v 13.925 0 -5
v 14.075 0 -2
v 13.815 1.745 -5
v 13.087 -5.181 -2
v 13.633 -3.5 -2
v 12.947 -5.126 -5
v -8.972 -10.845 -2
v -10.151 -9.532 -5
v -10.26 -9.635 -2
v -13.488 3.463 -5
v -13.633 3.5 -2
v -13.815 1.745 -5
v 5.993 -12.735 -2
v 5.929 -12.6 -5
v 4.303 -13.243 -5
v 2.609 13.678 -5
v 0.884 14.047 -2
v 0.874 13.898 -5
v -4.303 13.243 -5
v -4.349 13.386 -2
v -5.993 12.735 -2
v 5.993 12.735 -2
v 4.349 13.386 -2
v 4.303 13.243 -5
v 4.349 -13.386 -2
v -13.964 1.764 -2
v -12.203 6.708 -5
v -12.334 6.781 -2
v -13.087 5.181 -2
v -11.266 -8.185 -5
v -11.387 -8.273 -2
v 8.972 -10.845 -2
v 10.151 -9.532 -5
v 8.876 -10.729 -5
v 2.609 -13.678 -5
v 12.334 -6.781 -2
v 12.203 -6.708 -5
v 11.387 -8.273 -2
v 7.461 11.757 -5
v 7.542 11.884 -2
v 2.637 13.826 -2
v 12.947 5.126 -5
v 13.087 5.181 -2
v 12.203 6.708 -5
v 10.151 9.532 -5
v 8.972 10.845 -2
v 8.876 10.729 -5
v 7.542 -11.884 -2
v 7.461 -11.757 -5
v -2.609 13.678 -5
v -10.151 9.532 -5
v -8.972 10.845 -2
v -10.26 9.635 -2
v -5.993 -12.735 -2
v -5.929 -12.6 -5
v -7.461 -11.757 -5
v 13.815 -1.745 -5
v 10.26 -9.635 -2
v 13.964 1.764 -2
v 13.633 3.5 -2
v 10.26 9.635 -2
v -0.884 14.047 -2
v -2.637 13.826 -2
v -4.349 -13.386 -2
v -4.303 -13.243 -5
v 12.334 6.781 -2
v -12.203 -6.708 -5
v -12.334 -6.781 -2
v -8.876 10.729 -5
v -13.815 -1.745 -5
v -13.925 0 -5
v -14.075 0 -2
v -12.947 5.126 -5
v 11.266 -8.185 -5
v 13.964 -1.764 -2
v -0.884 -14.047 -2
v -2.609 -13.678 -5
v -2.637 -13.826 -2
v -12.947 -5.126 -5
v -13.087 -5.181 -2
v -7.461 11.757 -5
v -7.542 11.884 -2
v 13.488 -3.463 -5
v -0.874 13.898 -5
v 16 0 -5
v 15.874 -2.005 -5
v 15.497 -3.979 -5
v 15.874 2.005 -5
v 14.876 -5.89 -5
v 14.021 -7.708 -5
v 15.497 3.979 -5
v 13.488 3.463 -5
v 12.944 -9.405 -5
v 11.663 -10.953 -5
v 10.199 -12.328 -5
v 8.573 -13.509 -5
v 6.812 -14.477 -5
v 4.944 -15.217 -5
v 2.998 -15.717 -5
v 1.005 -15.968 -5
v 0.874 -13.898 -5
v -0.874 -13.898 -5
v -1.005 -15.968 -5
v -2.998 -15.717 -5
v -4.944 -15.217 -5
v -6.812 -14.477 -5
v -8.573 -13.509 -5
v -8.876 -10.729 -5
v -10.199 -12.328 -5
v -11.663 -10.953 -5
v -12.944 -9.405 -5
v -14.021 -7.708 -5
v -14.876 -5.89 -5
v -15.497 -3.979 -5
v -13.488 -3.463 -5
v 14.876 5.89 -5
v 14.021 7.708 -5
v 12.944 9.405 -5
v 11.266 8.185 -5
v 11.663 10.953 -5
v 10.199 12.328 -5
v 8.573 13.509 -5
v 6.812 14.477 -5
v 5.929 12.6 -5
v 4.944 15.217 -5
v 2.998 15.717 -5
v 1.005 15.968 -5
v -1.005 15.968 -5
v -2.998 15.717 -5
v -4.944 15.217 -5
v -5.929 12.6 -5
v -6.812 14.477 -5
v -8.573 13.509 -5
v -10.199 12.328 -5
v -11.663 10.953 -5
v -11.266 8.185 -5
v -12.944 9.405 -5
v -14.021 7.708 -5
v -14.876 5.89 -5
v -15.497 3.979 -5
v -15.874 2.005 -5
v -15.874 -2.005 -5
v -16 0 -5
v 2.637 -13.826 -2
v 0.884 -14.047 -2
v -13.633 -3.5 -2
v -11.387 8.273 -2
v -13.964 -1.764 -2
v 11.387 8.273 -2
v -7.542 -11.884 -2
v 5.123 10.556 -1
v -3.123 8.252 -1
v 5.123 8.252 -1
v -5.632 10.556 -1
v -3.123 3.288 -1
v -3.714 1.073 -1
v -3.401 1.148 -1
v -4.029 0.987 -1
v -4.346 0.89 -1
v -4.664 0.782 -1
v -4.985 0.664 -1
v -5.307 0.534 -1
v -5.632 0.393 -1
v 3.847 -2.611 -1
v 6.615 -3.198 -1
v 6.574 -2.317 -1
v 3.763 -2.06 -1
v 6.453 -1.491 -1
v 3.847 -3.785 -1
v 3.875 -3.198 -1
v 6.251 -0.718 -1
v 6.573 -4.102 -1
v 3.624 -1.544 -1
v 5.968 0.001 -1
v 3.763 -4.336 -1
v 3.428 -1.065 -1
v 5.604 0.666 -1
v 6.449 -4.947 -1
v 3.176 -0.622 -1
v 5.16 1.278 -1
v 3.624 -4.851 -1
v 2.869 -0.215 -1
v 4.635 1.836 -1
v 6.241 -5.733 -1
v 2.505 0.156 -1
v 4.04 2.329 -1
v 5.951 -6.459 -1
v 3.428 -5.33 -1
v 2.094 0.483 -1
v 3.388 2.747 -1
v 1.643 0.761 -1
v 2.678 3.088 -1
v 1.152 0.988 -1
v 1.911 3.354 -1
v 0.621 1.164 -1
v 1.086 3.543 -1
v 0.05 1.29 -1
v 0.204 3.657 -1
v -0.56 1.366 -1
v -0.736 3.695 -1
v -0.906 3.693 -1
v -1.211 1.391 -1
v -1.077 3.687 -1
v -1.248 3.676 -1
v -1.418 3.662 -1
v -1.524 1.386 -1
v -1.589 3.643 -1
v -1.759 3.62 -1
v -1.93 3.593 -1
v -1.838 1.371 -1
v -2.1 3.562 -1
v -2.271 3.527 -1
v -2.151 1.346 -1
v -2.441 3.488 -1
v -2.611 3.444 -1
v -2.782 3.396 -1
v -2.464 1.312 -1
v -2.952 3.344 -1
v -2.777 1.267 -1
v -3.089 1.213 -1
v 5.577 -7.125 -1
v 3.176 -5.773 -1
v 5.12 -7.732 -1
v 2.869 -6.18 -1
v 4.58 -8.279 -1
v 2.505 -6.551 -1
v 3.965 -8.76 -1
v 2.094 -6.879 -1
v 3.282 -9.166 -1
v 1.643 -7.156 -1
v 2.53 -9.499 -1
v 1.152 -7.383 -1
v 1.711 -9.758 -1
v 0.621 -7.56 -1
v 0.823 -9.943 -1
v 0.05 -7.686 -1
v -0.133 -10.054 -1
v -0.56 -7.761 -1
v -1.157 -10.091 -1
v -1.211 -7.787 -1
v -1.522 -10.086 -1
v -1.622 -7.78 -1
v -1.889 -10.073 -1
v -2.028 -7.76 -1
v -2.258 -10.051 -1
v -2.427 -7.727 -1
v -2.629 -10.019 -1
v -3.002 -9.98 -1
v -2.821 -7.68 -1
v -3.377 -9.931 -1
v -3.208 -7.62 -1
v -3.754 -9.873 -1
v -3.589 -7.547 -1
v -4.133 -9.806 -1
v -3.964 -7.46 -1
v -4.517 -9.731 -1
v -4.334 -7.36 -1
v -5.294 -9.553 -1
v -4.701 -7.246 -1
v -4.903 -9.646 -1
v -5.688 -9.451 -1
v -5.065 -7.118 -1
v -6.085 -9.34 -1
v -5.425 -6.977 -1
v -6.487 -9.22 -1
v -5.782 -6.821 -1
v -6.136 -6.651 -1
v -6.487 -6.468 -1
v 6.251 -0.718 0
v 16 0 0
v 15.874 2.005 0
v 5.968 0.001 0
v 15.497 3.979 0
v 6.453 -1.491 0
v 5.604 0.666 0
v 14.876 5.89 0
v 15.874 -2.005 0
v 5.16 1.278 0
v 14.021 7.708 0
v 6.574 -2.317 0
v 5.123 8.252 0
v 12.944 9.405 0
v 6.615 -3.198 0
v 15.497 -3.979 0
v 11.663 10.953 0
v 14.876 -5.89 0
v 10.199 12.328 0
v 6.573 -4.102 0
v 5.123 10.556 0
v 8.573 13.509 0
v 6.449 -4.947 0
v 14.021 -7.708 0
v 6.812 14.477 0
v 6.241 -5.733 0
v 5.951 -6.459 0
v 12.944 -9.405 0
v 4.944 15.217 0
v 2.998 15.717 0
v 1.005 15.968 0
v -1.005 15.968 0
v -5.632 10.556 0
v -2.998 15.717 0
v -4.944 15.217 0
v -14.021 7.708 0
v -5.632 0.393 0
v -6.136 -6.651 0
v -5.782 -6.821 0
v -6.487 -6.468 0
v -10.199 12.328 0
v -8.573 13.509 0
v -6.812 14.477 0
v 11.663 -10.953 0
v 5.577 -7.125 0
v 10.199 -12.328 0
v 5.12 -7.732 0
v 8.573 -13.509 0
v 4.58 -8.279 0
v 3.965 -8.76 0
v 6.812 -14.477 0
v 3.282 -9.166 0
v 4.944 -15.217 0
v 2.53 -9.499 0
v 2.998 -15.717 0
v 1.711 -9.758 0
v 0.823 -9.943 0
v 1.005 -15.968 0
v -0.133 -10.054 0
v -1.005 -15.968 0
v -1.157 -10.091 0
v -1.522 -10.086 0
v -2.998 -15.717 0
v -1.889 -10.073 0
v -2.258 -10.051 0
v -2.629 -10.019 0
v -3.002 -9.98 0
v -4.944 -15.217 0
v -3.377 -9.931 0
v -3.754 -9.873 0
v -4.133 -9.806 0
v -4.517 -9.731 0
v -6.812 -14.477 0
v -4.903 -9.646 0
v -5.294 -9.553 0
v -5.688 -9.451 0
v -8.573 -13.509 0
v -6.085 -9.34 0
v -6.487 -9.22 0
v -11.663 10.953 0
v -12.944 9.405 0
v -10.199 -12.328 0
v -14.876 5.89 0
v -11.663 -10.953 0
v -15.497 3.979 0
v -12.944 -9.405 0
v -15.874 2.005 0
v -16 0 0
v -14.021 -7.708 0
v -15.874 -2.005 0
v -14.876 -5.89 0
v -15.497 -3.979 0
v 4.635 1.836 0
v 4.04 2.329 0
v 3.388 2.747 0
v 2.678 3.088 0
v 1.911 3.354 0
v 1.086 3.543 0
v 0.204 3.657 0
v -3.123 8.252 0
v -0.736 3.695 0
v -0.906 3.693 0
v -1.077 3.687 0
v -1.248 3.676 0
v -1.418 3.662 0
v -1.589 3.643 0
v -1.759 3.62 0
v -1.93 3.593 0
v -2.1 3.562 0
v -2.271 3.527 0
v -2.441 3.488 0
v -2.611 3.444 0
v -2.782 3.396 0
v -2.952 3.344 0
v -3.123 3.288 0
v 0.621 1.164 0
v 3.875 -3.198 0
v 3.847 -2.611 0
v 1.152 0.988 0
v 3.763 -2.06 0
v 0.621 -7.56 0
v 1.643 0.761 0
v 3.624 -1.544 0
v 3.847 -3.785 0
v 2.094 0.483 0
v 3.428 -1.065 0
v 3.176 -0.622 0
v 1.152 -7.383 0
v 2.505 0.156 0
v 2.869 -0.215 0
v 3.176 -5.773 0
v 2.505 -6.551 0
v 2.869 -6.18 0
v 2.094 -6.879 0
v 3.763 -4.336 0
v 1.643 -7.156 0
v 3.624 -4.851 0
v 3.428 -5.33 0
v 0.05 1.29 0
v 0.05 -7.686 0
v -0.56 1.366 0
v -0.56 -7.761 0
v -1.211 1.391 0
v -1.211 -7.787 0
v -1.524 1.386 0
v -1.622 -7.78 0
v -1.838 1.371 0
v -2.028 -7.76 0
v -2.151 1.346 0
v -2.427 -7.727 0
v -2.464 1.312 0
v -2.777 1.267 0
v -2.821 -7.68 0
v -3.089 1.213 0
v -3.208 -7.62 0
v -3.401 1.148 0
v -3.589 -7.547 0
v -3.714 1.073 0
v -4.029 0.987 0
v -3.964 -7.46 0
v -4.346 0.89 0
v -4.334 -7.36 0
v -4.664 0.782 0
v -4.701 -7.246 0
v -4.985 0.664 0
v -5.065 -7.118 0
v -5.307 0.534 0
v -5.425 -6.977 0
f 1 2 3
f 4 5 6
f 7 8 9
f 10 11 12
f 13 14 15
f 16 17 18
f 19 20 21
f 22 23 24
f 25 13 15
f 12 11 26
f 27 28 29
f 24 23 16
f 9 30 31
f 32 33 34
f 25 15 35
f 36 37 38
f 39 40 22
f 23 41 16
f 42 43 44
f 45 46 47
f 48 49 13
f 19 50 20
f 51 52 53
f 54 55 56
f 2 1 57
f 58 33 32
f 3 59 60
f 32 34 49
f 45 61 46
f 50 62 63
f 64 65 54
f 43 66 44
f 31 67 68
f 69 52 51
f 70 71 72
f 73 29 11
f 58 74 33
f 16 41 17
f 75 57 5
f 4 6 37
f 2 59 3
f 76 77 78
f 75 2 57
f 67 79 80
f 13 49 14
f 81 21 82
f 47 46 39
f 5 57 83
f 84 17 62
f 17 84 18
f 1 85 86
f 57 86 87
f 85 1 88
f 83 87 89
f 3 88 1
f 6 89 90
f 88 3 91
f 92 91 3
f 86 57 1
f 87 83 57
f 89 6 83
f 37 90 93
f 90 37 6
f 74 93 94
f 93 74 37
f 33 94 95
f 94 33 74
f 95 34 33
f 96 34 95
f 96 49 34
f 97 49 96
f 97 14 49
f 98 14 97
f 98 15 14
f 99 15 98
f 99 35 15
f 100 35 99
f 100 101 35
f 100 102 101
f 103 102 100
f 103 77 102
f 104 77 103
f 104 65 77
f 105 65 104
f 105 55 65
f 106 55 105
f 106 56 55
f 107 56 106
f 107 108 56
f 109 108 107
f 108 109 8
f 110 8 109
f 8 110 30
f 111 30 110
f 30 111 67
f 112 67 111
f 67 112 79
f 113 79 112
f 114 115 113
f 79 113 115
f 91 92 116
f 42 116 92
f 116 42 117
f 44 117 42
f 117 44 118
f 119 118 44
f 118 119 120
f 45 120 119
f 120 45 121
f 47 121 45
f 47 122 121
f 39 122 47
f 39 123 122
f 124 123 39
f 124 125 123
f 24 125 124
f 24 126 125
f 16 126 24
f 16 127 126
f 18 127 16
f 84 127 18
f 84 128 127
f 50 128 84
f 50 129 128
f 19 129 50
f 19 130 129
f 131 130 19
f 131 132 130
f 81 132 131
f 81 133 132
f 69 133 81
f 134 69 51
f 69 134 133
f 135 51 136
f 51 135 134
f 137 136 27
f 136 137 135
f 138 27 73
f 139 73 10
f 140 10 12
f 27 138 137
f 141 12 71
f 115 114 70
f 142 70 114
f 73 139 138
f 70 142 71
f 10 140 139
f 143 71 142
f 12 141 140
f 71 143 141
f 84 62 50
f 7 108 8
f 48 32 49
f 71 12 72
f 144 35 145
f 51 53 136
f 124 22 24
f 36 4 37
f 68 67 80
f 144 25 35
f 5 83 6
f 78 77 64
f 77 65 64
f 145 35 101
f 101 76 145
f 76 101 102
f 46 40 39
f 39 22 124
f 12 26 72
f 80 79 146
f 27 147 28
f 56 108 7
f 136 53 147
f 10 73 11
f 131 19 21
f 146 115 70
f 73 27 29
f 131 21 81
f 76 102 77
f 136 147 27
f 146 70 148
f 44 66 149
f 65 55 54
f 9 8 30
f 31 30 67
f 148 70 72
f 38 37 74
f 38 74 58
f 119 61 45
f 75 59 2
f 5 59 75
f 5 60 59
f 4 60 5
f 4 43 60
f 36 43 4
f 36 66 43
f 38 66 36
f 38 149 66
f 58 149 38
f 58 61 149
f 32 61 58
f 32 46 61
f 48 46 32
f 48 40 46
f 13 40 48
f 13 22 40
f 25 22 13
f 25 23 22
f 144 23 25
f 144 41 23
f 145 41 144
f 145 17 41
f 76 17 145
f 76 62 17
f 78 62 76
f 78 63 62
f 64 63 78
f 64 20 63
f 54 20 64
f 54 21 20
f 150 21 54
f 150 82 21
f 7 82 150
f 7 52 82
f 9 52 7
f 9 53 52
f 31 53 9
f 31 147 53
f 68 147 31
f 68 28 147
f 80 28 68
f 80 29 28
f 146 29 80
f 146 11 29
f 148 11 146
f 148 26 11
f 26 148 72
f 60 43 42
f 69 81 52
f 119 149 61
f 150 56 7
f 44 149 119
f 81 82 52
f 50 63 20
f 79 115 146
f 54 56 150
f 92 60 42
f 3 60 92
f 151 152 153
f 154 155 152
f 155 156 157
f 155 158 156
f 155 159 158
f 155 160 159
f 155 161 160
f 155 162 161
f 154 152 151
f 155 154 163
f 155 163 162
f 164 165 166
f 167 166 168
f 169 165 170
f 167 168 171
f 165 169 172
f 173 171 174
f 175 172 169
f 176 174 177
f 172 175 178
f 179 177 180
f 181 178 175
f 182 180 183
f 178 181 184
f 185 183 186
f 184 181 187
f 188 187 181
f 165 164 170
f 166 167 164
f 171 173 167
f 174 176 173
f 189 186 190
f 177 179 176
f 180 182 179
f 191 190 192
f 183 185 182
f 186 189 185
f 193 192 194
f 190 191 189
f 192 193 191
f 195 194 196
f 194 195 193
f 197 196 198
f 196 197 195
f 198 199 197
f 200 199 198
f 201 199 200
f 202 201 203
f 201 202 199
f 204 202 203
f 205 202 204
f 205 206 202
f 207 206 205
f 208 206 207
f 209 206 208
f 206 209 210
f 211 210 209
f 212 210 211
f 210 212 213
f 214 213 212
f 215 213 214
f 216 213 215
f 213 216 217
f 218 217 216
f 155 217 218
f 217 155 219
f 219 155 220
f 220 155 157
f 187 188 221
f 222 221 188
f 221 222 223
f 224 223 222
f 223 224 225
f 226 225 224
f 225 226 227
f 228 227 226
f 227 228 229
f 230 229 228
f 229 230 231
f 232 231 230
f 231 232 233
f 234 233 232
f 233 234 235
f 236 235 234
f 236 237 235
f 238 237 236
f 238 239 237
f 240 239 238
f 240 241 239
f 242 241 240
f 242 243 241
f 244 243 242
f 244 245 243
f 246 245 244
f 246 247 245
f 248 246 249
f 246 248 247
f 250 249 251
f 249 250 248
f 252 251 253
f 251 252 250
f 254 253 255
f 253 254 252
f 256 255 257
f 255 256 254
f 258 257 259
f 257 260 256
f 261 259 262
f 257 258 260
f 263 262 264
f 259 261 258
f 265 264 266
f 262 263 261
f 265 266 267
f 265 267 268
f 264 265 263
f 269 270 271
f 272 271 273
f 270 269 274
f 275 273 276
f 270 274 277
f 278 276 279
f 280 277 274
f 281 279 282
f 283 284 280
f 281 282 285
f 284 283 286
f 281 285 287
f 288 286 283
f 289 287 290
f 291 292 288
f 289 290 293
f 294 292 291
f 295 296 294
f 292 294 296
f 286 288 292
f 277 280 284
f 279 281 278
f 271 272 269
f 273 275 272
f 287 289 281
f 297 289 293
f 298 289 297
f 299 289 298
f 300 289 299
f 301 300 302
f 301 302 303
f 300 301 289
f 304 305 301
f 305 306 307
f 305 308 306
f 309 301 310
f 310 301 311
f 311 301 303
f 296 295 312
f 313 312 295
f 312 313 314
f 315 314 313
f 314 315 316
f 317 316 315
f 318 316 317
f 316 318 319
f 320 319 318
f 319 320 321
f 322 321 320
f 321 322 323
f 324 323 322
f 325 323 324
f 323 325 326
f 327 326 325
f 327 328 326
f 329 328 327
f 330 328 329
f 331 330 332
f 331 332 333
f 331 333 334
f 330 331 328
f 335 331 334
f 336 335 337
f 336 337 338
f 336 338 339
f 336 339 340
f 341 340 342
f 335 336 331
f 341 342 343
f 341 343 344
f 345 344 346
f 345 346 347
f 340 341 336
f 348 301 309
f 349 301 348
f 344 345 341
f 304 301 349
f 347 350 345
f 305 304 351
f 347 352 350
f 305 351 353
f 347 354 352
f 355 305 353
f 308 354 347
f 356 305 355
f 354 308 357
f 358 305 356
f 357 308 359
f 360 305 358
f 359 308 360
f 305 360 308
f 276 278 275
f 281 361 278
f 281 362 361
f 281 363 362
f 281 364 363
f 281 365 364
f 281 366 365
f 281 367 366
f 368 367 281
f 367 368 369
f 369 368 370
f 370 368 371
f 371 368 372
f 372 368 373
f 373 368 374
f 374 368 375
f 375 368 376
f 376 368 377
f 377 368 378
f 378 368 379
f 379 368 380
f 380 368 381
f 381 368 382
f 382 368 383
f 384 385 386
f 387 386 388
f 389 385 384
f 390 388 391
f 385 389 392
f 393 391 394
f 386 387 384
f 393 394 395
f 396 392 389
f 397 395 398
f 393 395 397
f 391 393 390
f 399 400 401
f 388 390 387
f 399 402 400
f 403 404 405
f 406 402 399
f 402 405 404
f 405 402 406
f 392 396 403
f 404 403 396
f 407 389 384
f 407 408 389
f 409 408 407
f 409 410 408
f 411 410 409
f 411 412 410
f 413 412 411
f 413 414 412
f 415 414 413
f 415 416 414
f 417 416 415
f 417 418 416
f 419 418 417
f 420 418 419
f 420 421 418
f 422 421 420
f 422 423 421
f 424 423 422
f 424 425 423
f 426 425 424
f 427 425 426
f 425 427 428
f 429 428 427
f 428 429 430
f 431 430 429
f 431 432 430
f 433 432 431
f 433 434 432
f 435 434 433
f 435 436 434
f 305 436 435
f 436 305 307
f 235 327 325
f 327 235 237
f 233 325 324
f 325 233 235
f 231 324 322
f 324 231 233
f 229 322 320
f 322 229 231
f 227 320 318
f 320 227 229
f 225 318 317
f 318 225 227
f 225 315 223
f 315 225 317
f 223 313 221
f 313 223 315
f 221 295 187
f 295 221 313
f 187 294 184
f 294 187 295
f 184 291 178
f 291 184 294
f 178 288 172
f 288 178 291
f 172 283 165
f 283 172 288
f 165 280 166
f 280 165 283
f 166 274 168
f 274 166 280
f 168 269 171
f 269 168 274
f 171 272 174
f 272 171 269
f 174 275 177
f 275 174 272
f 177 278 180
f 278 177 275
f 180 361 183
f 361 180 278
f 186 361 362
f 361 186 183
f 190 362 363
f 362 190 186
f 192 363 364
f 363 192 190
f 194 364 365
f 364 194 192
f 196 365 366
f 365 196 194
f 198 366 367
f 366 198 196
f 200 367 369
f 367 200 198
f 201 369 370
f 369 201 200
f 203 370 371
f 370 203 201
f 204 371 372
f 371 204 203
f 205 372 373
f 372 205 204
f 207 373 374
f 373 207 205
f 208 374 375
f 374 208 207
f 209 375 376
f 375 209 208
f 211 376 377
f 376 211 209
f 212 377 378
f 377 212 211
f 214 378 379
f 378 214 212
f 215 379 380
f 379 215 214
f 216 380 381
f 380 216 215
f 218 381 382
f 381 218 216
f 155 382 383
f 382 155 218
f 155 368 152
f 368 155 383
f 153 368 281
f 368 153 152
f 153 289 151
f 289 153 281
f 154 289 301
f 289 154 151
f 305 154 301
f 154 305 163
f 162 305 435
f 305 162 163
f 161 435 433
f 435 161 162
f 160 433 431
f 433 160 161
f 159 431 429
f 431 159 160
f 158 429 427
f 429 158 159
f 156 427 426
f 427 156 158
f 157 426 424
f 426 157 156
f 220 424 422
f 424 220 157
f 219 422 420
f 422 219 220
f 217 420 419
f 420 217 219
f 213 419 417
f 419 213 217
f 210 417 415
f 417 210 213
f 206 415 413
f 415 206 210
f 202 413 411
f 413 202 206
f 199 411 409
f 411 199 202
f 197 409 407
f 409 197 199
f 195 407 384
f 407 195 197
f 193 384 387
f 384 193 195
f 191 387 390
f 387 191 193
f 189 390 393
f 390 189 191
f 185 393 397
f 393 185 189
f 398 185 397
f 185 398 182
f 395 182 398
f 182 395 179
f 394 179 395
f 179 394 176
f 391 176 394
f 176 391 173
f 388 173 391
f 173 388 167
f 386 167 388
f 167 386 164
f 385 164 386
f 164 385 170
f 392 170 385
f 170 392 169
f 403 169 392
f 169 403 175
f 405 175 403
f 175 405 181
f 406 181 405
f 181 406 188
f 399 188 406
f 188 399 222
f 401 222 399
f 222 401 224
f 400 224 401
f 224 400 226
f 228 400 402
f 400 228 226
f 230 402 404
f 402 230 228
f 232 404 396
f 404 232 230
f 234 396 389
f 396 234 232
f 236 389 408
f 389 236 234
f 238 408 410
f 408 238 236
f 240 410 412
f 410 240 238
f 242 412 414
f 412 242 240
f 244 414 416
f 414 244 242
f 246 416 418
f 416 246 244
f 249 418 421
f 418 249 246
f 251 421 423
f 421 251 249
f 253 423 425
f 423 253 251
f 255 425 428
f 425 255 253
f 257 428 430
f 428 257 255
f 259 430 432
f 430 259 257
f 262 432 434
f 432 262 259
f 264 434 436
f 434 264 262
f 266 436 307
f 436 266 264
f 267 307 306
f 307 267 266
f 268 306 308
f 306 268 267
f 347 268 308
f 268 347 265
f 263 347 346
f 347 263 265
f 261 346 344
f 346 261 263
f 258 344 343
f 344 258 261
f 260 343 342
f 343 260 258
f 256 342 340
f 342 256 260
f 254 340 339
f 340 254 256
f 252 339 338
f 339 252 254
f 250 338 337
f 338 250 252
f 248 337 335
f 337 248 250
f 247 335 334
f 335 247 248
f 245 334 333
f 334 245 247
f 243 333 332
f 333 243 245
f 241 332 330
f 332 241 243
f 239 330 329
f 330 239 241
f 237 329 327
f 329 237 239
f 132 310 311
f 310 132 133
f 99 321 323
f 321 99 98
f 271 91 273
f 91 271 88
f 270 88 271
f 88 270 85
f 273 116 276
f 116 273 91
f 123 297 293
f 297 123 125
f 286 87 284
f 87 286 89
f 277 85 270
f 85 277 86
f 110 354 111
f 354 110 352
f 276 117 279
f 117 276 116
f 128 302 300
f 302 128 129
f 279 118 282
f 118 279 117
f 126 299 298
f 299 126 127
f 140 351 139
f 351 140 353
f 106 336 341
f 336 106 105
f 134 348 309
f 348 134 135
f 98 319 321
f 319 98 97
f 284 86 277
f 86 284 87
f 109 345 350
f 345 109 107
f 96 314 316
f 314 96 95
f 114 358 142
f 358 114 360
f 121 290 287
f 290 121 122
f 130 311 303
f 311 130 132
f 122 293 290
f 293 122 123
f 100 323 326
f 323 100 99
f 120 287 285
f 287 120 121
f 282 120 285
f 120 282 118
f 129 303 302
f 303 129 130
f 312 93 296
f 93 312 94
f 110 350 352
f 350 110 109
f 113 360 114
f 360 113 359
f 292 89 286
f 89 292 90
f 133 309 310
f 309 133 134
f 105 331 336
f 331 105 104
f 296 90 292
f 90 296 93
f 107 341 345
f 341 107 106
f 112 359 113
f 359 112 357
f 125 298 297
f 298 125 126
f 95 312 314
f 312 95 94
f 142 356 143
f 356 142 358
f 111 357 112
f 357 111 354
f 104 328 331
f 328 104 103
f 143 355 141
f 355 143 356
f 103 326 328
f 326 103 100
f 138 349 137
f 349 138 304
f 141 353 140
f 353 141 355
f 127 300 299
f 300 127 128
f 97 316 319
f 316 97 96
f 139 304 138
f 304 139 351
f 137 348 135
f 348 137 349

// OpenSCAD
$fn = 50;


difference() {
	union() {
		translate(v = [0, 0, -5.0000000000]) {
			cylinder(h = 5, r = 16.0000000000);
		}
	}
	union() {
		#translate(v = [0, 0, -5.0000000000]) {
			cylinder(h = 3, r1 = 13.9250000000, r2 = 14.0750000000);
		}
		translate(v = [0, 0, -1]) {
			linear_extrude(height = 1) {
				text(font = "Impact", halign = "center", size = 20, text = "5", valign = "center");
			}
		}
	}
}
